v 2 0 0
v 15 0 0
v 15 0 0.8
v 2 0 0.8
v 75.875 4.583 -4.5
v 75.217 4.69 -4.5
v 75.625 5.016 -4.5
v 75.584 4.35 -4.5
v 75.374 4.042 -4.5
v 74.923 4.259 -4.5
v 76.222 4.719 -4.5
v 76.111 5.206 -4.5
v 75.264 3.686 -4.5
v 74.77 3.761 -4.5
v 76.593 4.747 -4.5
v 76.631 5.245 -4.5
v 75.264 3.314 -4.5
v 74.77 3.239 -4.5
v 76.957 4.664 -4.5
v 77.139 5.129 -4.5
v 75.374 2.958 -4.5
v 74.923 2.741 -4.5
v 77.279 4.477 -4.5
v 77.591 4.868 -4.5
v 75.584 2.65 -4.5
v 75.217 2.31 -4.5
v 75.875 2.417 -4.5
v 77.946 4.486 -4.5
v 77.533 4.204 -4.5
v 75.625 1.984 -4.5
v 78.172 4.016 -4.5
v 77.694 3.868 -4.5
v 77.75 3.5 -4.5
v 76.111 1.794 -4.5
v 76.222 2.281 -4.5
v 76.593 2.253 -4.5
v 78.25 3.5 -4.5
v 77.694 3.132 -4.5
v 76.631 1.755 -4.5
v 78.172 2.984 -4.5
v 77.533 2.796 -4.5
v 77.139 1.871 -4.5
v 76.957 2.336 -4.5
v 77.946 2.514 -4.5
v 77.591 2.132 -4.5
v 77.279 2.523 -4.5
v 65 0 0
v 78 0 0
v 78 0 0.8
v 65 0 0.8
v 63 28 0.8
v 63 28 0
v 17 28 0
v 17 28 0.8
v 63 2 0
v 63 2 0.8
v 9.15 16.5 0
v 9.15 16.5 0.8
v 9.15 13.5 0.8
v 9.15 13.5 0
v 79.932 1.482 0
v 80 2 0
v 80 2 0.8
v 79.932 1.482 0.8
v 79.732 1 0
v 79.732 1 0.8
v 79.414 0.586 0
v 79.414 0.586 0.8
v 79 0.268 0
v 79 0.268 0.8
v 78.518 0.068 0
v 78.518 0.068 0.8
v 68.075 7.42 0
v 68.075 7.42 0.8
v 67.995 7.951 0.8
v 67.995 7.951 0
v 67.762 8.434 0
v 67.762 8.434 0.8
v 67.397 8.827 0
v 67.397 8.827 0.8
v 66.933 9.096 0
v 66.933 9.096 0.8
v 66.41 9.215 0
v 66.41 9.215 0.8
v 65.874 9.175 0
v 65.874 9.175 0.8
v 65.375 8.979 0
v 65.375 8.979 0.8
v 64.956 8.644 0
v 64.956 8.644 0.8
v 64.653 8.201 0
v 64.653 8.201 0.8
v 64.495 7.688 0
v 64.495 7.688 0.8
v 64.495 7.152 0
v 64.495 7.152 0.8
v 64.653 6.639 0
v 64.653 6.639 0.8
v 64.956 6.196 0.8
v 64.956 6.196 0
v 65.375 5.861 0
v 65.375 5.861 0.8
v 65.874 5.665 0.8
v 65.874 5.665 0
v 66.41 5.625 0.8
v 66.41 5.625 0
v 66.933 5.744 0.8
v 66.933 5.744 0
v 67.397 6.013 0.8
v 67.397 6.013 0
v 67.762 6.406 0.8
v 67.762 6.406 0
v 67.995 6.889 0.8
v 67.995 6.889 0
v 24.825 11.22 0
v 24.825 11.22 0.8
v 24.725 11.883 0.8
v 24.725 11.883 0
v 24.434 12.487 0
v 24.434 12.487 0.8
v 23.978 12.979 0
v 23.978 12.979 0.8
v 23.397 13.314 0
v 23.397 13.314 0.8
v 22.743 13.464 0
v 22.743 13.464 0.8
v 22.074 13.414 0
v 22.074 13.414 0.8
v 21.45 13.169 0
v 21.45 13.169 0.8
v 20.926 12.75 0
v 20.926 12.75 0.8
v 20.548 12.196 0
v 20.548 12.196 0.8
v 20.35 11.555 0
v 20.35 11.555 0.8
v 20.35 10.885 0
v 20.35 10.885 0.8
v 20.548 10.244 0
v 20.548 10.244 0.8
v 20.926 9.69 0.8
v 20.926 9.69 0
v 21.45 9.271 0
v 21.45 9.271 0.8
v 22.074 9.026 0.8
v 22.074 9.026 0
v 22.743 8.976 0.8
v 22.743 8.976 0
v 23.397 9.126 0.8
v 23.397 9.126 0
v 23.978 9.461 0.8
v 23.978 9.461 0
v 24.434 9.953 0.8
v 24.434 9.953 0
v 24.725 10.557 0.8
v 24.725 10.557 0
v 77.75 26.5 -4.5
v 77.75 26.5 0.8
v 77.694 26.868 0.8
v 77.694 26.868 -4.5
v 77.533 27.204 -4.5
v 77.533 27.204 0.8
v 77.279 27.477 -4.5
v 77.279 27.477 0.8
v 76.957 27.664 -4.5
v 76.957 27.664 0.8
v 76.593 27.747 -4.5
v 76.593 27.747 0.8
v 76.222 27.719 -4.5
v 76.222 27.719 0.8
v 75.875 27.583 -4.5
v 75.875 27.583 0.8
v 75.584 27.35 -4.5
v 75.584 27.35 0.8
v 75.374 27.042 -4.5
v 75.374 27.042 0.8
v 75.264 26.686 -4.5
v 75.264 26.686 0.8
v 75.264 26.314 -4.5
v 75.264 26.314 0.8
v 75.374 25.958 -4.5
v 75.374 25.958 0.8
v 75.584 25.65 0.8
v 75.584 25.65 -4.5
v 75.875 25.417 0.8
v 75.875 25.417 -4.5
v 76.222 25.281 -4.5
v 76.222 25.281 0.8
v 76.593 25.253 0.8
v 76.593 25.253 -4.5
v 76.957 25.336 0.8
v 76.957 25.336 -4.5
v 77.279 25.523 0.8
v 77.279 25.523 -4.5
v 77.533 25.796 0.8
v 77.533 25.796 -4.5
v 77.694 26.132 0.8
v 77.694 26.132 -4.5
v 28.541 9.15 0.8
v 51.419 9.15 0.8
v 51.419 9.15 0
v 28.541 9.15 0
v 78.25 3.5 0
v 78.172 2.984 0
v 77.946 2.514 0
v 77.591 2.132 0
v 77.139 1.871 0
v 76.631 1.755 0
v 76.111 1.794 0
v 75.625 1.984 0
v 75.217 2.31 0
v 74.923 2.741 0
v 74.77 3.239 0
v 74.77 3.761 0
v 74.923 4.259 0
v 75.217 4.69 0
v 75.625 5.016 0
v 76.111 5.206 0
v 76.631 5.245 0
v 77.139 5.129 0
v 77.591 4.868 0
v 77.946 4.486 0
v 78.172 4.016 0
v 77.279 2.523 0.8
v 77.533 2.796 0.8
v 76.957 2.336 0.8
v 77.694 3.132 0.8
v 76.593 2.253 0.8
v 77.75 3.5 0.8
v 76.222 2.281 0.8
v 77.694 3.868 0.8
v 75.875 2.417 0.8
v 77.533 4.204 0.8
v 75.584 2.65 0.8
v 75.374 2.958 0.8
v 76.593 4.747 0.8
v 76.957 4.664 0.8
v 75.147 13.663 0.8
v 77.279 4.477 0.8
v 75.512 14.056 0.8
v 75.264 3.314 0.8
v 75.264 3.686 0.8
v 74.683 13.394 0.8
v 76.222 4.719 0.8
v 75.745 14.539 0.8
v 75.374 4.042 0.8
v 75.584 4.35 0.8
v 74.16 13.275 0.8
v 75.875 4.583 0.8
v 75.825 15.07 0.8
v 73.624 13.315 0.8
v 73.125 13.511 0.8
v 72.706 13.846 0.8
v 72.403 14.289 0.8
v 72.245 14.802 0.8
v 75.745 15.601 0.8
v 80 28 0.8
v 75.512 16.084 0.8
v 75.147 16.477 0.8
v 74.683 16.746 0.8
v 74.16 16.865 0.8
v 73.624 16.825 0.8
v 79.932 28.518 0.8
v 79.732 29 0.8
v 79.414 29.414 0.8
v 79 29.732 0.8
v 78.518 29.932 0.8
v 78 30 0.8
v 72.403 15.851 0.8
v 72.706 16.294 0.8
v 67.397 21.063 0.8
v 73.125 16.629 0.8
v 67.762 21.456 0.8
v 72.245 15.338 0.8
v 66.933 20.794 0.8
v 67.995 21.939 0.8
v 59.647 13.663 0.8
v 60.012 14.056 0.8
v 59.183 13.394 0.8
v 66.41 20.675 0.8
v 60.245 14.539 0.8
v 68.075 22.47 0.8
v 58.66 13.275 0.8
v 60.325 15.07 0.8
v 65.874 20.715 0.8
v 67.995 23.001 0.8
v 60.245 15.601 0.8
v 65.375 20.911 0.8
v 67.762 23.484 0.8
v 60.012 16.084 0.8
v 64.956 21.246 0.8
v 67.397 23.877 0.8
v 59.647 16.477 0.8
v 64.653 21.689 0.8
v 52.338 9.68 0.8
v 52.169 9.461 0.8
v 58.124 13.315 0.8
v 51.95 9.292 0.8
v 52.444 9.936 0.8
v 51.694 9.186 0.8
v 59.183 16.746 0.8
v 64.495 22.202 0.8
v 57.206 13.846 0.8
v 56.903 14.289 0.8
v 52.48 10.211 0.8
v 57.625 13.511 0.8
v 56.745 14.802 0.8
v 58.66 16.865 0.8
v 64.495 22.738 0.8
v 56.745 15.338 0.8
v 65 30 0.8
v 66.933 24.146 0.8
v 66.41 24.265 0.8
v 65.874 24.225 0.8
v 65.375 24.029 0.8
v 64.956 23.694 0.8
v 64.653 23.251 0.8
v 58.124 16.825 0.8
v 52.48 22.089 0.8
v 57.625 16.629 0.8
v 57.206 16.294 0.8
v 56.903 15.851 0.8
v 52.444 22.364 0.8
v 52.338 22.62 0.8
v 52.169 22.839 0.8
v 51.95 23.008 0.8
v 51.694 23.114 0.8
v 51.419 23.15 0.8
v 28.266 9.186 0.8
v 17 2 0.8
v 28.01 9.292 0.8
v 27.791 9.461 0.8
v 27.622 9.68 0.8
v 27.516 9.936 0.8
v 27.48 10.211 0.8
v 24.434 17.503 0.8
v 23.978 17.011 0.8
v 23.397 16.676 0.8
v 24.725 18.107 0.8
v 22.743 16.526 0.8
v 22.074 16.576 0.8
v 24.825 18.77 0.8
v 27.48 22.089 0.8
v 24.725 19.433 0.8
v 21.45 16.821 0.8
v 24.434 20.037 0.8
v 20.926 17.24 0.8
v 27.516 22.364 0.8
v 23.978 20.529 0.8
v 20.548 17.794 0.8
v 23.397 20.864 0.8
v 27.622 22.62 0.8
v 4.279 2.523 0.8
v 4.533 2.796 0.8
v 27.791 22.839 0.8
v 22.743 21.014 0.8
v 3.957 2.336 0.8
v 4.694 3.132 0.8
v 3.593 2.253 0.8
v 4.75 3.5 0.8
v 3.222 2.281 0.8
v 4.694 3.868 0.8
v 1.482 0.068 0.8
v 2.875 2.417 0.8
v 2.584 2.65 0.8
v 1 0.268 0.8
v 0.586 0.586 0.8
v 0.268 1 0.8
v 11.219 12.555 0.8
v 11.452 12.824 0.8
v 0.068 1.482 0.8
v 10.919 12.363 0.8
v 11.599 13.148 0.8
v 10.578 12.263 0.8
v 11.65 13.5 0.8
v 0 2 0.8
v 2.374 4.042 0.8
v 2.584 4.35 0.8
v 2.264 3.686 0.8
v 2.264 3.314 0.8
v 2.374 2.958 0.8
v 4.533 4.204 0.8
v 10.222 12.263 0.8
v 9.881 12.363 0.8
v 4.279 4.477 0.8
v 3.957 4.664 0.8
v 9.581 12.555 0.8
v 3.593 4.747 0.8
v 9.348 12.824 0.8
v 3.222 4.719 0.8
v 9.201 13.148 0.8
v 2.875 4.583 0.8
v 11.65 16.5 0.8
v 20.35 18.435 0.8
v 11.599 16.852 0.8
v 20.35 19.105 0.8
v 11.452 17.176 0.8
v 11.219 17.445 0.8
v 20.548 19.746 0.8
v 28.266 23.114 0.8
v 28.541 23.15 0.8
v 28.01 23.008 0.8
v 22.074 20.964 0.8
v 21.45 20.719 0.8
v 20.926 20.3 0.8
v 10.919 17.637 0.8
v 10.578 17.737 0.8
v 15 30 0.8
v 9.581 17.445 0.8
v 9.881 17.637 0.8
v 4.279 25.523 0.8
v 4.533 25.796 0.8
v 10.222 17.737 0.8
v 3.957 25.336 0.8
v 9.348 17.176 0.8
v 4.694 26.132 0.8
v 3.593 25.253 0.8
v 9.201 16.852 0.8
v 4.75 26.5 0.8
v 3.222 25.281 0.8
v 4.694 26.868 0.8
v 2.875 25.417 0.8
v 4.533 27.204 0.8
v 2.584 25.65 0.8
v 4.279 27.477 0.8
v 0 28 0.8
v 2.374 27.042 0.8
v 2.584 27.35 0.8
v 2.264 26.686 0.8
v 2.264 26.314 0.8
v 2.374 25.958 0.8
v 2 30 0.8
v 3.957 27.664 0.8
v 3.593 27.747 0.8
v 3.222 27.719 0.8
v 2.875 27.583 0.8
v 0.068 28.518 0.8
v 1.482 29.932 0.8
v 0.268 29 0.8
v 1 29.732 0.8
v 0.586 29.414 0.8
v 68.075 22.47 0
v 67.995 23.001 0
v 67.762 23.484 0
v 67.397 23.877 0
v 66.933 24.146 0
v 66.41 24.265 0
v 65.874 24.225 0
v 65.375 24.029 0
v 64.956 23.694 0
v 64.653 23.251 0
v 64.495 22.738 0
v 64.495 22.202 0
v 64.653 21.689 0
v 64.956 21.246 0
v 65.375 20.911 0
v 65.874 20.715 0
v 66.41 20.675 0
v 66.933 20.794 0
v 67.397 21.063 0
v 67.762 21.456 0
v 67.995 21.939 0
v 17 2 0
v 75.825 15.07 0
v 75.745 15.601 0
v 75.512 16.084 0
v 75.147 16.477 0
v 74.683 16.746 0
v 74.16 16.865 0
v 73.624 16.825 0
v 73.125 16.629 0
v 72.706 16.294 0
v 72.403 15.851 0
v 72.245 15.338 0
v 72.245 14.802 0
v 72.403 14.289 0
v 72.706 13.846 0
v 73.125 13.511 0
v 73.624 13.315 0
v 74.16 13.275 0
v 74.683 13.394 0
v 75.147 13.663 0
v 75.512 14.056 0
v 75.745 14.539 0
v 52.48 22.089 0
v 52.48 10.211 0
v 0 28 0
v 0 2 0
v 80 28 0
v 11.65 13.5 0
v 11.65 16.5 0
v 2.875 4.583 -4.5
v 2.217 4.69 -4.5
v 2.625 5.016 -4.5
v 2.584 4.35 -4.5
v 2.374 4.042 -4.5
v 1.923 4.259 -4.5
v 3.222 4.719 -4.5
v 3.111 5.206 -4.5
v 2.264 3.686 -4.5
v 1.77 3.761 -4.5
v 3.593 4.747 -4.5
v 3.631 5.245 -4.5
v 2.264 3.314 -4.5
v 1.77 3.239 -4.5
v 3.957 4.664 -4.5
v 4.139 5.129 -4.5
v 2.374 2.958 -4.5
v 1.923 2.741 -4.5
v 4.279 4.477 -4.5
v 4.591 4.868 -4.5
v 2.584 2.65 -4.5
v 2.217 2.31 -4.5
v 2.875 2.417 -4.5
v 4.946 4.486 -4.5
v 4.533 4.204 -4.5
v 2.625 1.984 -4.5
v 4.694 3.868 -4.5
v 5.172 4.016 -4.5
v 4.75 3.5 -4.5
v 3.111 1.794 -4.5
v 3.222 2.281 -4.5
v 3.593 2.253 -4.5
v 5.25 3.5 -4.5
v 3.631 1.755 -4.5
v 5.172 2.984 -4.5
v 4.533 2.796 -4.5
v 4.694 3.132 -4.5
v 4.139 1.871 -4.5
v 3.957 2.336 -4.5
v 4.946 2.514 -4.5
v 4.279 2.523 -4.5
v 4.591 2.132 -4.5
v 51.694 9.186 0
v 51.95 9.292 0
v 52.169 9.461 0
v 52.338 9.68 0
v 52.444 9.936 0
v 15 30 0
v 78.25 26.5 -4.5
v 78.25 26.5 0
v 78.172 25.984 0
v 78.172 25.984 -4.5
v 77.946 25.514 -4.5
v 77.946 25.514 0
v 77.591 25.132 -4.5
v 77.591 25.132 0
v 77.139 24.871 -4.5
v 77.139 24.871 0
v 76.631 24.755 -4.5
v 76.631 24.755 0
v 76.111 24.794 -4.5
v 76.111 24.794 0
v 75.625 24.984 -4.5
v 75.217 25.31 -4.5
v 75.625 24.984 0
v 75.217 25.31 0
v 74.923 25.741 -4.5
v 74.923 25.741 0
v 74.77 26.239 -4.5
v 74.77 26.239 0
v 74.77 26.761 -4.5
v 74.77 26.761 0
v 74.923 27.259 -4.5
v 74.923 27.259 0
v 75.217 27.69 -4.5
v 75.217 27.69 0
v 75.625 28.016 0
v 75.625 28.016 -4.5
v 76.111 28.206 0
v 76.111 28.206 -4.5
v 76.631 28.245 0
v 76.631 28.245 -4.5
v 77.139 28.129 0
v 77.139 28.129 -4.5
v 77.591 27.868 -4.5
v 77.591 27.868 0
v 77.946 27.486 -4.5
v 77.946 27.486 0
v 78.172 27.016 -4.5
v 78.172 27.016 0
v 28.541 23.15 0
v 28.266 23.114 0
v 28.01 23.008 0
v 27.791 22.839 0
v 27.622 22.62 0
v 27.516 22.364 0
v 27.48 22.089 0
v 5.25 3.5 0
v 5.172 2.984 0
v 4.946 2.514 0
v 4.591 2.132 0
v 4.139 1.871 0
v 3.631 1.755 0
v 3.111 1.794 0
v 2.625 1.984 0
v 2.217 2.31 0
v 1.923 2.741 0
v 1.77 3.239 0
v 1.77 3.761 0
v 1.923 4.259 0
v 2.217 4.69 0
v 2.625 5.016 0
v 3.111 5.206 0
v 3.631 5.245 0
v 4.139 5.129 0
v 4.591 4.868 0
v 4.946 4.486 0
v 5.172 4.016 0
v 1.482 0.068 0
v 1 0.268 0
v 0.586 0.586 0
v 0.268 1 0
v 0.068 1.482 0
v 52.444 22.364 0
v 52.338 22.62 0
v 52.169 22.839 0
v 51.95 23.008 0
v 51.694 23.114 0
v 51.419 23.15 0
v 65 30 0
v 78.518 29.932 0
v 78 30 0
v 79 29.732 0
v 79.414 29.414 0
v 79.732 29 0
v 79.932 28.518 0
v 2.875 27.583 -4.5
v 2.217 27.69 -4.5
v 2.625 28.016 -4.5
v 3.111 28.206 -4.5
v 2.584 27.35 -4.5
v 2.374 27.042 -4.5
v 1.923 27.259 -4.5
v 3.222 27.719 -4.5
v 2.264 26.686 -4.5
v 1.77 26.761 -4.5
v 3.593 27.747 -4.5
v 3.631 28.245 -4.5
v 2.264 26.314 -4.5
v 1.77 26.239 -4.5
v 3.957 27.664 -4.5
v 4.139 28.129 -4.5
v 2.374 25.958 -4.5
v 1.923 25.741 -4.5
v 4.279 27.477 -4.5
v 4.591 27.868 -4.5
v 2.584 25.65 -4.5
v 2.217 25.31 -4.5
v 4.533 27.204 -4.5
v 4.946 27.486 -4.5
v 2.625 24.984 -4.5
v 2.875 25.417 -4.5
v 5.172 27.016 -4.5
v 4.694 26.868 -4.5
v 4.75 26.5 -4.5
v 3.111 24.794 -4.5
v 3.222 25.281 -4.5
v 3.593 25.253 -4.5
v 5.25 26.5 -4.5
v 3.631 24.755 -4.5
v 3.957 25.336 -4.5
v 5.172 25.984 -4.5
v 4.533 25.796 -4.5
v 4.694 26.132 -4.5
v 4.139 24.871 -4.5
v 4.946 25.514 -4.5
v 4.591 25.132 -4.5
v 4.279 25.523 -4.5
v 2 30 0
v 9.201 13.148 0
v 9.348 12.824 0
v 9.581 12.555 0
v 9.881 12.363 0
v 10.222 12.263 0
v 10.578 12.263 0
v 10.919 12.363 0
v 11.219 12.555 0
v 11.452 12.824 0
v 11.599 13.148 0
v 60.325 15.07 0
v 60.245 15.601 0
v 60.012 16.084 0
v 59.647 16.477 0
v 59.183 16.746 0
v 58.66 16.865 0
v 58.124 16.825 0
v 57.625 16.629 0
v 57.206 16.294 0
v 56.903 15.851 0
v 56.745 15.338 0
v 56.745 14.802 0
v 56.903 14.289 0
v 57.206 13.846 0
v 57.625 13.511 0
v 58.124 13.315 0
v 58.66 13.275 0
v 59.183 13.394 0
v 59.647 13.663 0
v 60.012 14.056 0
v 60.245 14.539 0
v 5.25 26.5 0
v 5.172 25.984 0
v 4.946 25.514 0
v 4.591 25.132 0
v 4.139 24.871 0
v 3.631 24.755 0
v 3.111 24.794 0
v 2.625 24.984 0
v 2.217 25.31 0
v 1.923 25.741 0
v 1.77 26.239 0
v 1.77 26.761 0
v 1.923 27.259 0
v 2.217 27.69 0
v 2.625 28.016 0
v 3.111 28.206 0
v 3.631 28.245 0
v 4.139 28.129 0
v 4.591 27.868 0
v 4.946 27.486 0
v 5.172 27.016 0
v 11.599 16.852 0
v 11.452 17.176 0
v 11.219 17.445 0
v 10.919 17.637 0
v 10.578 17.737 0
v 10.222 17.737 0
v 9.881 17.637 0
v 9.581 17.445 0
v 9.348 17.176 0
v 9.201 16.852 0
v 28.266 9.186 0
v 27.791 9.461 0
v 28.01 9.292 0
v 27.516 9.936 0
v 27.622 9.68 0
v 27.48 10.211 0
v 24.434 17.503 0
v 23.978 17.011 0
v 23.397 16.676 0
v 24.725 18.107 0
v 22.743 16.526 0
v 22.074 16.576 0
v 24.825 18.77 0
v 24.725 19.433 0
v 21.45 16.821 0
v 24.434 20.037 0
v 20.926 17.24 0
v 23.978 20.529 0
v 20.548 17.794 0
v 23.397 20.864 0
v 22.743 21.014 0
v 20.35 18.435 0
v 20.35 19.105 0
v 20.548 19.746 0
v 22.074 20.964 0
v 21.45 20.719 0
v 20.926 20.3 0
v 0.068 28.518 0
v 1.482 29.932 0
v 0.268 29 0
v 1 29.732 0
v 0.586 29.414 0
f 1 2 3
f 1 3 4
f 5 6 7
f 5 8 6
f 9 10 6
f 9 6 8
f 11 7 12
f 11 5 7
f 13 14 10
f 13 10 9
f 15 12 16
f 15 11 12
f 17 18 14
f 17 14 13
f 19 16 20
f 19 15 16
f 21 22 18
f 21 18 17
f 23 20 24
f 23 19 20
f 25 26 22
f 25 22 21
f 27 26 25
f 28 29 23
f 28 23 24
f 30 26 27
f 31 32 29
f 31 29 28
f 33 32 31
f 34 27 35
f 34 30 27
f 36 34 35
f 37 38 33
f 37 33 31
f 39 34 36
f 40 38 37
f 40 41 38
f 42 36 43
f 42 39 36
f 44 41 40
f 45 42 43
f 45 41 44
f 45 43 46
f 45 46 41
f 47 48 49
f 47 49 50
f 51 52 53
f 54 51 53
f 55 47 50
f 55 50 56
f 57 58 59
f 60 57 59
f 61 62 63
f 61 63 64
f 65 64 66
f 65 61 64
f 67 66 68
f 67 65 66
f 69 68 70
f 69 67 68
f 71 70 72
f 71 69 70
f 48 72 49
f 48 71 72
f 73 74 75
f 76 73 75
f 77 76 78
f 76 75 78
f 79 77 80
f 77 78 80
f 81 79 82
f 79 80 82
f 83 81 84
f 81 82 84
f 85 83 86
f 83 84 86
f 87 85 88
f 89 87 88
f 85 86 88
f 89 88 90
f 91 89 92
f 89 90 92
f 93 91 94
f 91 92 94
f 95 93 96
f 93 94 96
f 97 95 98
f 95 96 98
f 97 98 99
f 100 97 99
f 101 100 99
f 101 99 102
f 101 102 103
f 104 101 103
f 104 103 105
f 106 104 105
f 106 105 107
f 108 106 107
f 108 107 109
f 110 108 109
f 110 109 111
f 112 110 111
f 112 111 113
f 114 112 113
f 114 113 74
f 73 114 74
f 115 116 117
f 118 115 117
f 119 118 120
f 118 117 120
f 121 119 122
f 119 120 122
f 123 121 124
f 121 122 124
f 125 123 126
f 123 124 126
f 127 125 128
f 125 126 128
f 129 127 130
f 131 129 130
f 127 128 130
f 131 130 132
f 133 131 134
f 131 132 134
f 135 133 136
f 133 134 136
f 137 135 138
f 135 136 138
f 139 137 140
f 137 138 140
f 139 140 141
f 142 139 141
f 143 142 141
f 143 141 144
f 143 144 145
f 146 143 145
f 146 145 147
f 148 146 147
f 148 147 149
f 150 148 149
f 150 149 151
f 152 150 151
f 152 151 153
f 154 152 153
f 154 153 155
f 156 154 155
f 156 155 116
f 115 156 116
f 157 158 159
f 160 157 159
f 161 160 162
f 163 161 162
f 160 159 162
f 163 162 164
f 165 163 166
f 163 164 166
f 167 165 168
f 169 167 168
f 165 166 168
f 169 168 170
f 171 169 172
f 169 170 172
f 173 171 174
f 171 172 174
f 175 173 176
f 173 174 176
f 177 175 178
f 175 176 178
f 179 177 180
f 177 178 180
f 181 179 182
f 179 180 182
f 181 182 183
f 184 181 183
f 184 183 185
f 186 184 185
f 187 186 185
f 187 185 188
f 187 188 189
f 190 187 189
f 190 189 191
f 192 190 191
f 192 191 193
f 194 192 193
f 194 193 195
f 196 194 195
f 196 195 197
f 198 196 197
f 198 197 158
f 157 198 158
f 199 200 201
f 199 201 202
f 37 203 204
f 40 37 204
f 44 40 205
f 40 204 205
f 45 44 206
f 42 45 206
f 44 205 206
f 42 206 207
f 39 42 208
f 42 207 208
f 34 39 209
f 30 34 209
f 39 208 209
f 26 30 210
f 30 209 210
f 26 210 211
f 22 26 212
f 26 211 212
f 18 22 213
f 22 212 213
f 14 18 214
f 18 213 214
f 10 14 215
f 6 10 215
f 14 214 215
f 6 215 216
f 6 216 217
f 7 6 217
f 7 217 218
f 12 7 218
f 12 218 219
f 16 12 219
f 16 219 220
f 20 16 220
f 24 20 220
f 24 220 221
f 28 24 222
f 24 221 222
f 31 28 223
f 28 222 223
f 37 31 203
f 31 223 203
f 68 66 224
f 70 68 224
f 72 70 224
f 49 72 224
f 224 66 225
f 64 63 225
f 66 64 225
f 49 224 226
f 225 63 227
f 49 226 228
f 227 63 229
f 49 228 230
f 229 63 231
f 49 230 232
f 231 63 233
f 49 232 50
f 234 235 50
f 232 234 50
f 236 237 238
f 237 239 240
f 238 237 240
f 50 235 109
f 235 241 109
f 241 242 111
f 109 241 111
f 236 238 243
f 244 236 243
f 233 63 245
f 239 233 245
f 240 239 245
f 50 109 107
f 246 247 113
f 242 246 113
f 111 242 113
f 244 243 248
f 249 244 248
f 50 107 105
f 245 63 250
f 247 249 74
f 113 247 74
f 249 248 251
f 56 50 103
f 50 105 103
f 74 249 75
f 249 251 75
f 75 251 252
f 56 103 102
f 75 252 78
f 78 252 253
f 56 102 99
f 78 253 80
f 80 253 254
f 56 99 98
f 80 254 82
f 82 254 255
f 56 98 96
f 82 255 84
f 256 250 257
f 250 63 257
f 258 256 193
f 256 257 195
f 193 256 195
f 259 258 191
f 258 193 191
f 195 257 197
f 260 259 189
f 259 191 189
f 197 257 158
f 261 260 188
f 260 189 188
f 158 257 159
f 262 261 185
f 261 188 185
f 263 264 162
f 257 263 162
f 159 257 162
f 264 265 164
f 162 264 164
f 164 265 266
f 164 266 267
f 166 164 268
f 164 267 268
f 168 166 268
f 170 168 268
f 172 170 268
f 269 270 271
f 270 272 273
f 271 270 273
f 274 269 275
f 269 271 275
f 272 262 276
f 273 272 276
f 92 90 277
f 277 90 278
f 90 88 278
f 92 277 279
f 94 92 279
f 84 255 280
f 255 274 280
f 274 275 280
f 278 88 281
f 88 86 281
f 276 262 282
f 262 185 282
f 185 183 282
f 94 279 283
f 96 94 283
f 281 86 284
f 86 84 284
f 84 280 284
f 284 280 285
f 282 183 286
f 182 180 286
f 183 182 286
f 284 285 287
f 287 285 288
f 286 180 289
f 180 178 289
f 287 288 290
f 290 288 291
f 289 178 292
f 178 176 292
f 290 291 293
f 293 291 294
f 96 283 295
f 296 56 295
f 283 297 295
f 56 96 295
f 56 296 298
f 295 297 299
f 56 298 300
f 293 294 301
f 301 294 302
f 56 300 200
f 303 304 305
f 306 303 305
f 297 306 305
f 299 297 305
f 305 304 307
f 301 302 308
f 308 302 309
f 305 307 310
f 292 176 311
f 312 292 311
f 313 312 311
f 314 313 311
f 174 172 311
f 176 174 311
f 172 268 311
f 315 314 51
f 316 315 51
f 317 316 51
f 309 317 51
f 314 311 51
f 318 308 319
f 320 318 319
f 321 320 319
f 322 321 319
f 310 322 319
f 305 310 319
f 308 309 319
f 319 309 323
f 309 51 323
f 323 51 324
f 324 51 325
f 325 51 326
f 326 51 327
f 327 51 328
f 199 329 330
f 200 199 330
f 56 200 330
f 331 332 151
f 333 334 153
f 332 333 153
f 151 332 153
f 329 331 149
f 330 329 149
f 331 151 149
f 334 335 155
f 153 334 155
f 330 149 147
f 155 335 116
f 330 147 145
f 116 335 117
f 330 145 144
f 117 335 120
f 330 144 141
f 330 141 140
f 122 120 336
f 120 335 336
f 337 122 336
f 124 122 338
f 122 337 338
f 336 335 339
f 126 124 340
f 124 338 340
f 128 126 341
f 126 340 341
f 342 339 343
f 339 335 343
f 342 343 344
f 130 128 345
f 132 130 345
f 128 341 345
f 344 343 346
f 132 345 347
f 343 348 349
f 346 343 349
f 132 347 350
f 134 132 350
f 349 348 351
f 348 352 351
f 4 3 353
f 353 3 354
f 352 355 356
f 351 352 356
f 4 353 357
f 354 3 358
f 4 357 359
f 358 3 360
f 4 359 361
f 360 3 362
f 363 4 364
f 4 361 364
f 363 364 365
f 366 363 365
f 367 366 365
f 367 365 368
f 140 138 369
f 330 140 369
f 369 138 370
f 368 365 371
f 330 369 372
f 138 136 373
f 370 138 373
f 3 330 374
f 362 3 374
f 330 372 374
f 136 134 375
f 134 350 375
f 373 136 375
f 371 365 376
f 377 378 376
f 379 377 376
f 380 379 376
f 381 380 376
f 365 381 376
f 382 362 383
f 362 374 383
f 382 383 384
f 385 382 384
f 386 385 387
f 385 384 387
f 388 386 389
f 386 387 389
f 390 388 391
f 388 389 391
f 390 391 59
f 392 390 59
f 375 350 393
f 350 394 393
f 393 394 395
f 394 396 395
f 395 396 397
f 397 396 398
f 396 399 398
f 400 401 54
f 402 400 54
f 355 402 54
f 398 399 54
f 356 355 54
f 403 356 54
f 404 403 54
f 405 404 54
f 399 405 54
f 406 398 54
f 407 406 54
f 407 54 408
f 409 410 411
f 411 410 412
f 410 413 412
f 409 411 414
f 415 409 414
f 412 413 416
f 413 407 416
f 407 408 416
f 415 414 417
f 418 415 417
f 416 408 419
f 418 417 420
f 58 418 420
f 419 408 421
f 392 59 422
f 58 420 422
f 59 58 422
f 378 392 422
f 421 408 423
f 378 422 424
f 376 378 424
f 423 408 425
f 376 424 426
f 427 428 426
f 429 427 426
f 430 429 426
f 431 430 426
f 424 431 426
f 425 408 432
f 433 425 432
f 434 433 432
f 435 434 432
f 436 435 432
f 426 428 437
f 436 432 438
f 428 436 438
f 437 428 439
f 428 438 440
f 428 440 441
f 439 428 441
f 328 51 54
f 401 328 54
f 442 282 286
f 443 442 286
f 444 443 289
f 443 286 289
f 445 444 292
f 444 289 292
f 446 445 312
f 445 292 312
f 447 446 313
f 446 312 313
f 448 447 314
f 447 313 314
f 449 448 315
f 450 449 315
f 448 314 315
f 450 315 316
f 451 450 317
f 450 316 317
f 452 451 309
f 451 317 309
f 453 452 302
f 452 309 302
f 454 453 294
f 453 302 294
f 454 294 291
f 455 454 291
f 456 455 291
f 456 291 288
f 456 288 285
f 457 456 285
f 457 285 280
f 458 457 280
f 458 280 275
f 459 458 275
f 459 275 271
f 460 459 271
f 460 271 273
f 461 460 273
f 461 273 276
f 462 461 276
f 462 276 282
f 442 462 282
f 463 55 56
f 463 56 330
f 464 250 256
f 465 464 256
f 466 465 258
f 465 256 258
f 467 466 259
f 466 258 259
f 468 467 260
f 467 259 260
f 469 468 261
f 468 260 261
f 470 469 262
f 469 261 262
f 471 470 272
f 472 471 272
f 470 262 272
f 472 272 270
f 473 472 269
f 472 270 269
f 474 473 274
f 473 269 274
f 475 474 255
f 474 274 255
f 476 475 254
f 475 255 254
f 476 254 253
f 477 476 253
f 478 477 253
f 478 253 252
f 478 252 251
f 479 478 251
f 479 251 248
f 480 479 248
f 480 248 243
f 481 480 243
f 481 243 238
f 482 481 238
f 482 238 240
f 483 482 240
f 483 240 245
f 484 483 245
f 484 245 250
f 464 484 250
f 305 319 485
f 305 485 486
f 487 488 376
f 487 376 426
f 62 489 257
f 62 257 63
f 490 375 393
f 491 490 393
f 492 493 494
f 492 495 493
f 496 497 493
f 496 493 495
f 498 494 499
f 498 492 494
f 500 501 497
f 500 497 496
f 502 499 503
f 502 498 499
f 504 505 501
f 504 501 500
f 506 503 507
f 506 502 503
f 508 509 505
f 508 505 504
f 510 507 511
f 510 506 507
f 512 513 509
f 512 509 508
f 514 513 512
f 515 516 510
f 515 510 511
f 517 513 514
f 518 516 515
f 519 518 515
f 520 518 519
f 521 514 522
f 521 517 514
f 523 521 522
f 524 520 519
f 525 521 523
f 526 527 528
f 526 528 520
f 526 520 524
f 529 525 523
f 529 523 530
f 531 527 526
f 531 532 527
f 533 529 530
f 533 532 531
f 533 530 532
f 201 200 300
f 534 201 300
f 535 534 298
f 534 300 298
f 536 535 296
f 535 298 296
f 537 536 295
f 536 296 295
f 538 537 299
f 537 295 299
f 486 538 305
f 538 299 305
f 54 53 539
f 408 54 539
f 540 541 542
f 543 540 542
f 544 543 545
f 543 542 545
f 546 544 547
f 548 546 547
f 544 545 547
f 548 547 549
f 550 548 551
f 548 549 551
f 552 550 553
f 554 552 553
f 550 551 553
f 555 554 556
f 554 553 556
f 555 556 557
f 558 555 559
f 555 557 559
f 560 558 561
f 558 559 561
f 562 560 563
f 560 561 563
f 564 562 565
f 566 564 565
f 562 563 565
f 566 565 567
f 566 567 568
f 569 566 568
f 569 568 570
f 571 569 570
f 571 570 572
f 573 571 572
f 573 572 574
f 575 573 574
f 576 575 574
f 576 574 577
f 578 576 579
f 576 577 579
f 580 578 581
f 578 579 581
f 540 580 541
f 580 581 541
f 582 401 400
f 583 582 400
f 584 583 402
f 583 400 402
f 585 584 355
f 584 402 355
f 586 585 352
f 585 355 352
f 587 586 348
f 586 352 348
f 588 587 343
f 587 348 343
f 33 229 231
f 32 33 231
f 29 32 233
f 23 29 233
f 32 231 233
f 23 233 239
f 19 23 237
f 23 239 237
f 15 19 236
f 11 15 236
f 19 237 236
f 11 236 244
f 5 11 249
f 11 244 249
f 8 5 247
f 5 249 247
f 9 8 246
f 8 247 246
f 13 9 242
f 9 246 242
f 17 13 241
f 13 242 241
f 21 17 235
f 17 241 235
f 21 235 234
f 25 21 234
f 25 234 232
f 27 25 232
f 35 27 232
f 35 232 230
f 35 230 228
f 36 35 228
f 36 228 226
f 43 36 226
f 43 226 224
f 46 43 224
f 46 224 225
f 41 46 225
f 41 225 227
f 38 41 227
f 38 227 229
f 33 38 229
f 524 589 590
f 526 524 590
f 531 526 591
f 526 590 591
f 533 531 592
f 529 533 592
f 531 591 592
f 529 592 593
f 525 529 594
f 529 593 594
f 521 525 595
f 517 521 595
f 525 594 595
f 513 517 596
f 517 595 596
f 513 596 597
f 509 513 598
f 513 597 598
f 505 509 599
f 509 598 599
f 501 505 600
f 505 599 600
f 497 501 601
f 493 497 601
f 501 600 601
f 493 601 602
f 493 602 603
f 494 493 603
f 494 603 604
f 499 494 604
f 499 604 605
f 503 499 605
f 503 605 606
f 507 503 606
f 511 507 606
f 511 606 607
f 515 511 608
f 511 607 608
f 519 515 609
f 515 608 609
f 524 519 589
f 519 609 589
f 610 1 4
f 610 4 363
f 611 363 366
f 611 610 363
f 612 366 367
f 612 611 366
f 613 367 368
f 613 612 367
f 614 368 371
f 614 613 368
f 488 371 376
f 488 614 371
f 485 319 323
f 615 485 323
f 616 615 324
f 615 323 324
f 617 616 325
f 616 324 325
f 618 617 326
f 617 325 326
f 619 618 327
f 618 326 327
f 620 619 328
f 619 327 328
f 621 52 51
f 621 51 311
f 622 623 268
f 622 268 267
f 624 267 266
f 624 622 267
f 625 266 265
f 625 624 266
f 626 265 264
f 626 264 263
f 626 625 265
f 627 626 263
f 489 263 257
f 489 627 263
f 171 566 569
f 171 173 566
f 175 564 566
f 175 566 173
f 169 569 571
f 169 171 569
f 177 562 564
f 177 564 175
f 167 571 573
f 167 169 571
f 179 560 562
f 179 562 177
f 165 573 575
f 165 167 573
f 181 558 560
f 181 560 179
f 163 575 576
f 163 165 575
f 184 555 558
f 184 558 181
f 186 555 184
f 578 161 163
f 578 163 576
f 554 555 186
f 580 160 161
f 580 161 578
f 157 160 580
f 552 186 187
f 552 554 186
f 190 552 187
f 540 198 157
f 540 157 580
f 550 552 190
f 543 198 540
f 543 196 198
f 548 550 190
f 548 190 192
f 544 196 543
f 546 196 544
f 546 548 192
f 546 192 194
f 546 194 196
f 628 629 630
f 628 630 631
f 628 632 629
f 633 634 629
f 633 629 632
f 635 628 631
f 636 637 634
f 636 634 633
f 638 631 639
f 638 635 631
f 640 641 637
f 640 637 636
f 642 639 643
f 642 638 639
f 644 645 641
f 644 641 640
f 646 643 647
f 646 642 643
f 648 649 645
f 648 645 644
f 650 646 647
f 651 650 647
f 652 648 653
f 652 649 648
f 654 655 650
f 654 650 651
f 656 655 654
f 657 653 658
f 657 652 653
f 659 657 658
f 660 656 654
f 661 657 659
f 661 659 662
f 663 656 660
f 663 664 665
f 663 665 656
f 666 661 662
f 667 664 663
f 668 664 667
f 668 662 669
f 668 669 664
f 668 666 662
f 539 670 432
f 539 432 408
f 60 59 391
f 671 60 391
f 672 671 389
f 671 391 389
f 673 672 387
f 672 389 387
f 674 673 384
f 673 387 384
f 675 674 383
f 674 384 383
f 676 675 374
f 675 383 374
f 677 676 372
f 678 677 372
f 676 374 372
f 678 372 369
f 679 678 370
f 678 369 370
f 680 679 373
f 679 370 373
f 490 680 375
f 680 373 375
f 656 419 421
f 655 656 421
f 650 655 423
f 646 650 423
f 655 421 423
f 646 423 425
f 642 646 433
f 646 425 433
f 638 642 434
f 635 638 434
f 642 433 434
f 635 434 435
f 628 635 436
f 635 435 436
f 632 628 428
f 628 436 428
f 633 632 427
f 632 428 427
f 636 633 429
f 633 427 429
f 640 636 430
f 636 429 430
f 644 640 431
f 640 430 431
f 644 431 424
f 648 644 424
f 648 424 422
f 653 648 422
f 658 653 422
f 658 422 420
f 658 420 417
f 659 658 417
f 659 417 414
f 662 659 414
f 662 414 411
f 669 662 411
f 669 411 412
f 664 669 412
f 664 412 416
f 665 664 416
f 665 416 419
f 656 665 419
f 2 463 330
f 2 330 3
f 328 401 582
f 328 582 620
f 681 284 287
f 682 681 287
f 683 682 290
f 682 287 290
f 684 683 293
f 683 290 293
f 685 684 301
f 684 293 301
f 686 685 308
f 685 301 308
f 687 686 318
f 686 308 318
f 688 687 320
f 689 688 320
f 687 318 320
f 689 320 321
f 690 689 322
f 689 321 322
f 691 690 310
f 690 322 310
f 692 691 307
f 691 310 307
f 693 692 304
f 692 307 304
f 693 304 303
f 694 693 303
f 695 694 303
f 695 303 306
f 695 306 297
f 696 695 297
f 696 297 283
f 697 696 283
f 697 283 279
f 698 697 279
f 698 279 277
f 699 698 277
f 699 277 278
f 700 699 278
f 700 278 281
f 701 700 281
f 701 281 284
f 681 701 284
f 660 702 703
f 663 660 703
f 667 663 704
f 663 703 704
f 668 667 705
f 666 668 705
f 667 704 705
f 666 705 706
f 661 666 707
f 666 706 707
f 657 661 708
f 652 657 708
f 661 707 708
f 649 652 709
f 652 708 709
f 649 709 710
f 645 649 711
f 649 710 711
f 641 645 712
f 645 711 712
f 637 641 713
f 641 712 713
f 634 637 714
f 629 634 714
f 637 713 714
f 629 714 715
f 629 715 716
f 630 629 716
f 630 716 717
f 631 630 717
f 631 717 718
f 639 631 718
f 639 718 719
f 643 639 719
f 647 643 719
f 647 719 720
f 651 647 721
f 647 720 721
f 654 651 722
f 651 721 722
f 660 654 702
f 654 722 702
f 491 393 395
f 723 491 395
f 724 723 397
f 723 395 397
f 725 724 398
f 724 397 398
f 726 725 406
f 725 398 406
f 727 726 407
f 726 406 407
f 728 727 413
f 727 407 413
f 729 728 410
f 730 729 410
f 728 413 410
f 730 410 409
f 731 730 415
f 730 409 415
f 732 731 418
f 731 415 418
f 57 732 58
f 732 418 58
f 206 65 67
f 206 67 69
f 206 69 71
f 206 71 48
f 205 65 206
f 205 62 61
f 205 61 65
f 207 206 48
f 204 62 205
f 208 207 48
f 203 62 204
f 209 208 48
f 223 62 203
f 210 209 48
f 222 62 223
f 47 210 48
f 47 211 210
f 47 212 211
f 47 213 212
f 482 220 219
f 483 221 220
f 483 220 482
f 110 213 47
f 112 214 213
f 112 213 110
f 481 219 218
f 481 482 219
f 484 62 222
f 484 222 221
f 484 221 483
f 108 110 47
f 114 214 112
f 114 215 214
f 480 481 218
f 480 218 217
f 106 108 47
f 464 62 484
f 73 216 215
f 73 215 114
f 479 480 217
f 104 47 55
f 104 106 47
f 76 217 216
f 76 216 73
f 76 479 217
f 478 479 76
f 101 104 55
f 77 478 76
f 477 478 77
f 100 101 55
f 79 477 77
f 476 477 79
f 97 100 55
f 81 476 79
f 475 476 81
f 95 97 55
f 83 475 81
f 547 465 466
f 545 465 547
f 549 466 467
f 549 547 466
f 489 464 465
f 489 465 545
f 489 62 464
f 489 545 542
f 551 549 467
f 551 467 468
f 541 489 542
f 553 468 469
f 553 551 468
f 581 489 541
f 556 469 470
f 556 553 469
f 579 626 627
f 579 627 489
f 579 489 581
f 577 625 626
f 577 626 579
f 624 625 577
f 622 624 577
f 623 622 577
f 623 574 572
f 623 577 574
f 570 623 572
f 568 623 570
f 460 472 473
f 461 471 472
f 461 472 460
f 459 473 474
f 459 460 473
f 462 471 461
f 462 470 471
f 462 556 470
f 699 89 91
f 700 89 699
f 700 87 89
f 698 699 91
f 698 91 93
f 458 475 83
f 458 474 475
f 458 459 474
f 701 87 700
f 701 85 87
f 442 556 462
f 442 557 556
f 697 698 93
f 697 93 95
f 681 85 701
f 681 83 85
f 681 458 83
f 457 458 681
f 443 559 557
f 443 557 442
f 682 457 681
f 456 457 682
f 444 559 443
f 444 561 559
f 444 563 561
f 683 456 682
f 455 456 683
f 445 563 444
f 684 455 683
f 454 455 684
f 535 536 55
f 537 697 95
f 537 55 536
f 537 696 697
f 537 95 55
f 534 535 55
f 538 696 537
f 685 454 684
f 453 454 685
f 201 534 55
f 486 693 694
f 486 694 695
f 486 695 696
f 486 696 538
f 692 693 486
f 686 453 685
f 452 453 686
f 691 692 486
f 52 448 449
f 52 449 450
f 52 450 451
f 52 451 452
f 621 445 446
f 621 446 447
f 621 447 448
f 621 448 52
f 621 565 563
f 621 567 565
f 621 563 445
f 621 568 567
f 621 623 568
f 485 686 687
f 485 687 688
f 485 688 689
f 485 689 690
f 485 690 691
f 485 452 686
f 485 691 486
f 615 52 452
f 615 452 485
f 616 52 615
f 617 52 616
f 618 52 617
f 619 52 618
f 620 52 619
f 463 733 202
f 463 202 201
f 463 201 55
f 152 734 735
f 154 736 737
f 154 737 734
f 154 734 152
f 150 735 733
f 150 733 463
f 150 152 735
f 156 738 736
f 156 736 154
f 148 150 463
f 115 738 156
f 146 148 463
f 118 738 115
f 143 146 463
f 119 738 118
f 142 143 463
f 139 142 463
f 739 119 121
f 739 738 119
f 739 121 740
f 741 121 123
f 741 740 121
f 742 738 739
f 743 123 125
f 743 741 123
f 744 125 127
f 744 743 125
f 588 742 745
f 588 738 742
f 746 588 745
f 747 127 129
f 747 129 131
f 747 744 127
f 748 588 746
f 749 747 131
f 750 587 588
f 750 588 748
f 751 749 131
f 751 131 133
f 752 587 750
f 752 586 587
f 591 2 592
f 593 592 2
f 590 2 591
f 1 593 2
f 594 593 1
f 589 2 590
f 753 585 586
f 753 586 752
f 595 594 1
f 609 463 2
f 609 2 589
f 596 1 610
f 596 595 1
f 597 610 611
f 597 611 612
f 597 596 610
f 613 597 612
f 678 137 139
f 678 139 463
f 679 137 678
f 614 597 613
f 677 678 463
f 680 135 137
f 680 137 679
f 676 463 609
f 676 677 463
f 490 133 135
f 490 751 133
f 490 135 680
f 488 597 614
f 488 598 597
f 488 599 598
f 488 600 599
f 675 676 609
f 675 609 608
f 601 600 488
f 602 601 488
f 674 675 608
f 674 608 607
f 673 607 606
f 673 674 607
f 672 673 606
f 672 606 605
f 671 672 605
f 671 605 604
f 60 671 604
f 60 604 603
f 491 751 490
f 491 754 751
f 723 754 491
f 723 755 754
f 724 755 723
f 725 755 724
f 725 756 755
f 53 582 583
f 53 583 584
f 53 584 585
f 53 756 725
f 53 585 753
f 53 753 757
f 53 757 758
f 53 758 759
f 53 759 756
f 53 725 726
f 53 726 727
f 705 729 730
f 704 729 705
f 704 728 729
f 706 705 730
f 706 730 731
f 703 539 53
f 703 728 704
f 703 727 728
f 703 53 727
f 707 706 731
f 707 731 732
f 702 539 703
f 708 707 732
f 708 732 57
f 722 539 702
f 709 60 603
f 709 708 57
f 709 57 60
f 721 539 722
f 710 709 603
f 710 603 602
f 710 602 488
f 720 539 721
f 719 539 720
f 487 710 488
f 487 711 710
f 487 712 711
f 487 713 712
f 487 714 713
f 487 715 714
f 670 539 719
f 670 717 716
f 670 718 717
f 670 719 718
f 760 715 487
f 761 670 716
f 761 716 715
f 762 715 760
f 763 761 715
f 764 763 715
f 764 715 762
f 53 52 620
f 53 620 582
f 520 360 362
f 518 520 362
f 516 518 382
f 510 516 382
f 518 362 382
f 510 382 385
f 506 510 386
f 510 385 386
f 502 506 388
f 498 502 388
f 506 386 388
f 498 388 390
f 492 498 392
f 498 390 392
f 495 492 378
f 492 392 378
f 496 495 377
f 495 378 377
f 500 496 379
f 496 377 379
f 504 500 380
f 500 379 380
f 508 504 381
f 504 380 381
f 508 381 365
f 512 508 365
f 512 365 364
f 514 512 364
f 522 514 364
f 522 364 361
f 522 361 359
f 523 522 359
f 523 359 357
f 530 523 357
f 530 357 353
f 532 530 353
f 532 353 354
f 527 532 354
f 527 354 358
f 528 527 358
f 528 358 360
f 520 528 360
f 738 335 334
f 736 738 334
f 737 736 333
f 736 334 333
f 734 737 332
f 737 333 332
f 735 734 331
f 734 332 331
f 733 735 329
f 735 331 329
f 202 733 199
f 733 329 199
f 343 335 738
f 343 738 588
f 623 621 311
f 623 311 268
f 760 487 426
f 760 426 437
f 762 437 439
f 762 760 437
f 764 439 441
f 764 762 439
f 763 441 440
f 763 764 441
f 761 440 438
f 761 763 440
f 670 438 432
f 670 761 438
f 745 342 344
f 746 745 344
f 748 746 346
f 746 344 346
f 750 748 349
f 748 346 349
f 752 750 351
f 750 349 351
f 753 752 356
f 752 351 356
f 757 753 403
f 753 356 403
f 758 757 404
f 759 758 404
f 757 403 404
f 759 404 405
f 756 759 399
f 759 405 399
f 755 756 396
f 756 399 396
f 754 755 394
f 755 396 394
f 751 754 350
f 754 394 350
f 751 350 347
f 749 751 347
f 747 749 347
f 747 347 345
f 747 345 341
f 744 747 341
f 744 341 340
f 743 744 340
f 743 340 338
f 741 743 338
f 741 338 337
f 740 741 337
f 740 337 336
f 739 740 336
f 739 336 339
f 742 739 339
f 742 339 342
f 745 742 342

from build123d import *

# Parameters (mm, degrees)
PAD_DEPTH       = 0.8
POCKET_DEPTH    = 0.801
POCKET001_DEPTH = 0.801
SKETCH002_R     = 2.25
POCKET002_DEPTH = 0.801
SKETCH003_R     = 1.8
POCKET003_DEPTH = 0.801
SKETCH004_R     = 1.75
PAD001_DEPTH    = 4.5
SKETCH005_R     = 1.25
POCKET004_DEPTH = 5.301


with BuildPart() as part:
    # PCB_Sketch_76c7 → Pad (new body)
    with BuildSketch(Plane.XY):
        with BuildLine():
            Line((80, 28), (80, 2))
            ThreePointArc((80, 2), (79.414214, 0.585786), (78, 0))
            Line((78, 0), (65, 0))
            Line((65, 0), (63, 2))
            Line((63, 2), (17, 2))
            Line((17, 2), (15, 0))
            Line((15, 0), (2, 0))
            ThreePointArc((2, 0), (0.585786, 0.585786), (0, 2))
            Line((0, 2), (0, 28))
            ThreePointArc((0, 28), (0.585786, 29.414214), (2, 30))
            Line((2, 30), (15, 30))
            Line((17, 28), (15, 30))
            Line((63, 28), (17, 28))
            Line((63, 28), (65, 30))
            Line((65, 30), (78, 30))
            ThreePointArc((78, 30), (79.414214, 29.414214), (80, 28))
        make_face()
    extrude(amount=PAD_DEPTH)

    # Sketch (on Face18 of Pad) → Pocket (cut, through all)
    with BuildSketch(Plane.XY.offset(0.8)):
        with BuildLine():
            ThreePointArc((28.54066, 23.15), (27.79066, 22.83934), (27.48, 22.08934))
            Line((27.48, 10.21066), (27.48, 22.08934))
            ThreePointArc((27.48, 10.21066), (27.79066, 9.46066), (28.54066, 9.15))
            Line((51.41934, 9.15), (28.54066, 9.15))
            ThreePointArc((51.41934, 9.15), (52.16934, 9.46066), (52.48, 10.21066))
            Line((52.48, 22.08934), (52.48, 10.21066))
            ThreePointArc((52.48, 22.08934), (52.16934, 22.83934), (51.41934, 23.15))
            Line((28.54066, 23.15), (51.41934, 23.15))
        make_face()
    extrude(amount=-POCKET_DEPTH, mode=Mode.SUBTRACT)

    # Sketch001 (on Face5 of Pocket) → Pocket001 (cut, through all)
    with BuildSketch(Plane.XY.offset(0.8)):
        with BuildLine():
            ThreePointArc((11.65, 16.5), (10.4, 17.75), (9.15, 16.5))
            Line((9.15, 16.5), (9.15, 13.5))
            ThreePointArc((9.15, 13.5), (10.4, 12.25), (11.65, 13.5))
            Line((11.65, 13.5), (11.65, 16.5))
        make_face()
    extrude(amount=-POCKET001_DEPTH, mode=Mode.SUBTRACT)

    # Sketch002 (on Face5 of Pocket001) → Pocket002 (cut, through all)
    with BuildSketch(Plane.XY.offset(0.8)):
        with Locations((22.575, 18.77)):
            Circle(SKETCH002_R)
        with Locations((22.575, 11.22)):
            Circle(SKETCH002_R)
    extrude(amount=-POCKET002_DEPTH, mode=Mode.SUBTRACT)

    # Sketch003 (on Face5 of Pocket002) → Pocket003 (cut, through all)
    with BuildSketch(Plane.XY.offset(0.8)):
        with Locations((66.275, 22.47)):
            Circle(SKETCH003_R)
        with Locations((74.025, 15.07)):
            Circle(SKETCH003_R)
        with Locations((58.525, 15.07)):
            Circle(SKETCH003_R)
        with Locations((66.275, 7.42)):
            Circle(SKETCH003_R)
    extrude(amount=-POCKET003_DEPTH, mode=Mode.SUBTRACT)

    # Sketch004 (on Face4 of Pocket003) → Pad001 (join)
    with BuildSketch(Plane(origin=(0, 0, 0), x_dir=(1, 0, 0), z_dir=(0, 0, -1))):
        with Locations((3.5, -26.5)):
            Circle(SKETCH004_R)
        with Locations((3.5, -3.5)):
            Circle(SKETCH004_R)
        with Locations((76.5, -3.5)):
            Circle(SKETCH004_R)
        with Locations((76.5, -26.5)):
            Circle(SKETCH004_R)
    extrude(amount=PAD001_DEPTH)

    # Sketch005 (on Face5 of Pad001) → Pocket004 (cut, through all)
    with BuildSketch(Plane.XY.offset(0.8)):
        with Locations((3.5, 26.5)):
            Circle(SKETCH005_R)
        with Locations((3.5, 3.5)):
            Circle(SKETCH005_R)
        with Locations((76.5, 26.5)):
            Circle(SKETCH005_R)
        with Locations((76.5, 3.5)):
            Circle(SKETCH005_R)
    extrude(amount=-POCKET004_DEPTH, mode=Mode.SUBTRACT)


solid = part.part
